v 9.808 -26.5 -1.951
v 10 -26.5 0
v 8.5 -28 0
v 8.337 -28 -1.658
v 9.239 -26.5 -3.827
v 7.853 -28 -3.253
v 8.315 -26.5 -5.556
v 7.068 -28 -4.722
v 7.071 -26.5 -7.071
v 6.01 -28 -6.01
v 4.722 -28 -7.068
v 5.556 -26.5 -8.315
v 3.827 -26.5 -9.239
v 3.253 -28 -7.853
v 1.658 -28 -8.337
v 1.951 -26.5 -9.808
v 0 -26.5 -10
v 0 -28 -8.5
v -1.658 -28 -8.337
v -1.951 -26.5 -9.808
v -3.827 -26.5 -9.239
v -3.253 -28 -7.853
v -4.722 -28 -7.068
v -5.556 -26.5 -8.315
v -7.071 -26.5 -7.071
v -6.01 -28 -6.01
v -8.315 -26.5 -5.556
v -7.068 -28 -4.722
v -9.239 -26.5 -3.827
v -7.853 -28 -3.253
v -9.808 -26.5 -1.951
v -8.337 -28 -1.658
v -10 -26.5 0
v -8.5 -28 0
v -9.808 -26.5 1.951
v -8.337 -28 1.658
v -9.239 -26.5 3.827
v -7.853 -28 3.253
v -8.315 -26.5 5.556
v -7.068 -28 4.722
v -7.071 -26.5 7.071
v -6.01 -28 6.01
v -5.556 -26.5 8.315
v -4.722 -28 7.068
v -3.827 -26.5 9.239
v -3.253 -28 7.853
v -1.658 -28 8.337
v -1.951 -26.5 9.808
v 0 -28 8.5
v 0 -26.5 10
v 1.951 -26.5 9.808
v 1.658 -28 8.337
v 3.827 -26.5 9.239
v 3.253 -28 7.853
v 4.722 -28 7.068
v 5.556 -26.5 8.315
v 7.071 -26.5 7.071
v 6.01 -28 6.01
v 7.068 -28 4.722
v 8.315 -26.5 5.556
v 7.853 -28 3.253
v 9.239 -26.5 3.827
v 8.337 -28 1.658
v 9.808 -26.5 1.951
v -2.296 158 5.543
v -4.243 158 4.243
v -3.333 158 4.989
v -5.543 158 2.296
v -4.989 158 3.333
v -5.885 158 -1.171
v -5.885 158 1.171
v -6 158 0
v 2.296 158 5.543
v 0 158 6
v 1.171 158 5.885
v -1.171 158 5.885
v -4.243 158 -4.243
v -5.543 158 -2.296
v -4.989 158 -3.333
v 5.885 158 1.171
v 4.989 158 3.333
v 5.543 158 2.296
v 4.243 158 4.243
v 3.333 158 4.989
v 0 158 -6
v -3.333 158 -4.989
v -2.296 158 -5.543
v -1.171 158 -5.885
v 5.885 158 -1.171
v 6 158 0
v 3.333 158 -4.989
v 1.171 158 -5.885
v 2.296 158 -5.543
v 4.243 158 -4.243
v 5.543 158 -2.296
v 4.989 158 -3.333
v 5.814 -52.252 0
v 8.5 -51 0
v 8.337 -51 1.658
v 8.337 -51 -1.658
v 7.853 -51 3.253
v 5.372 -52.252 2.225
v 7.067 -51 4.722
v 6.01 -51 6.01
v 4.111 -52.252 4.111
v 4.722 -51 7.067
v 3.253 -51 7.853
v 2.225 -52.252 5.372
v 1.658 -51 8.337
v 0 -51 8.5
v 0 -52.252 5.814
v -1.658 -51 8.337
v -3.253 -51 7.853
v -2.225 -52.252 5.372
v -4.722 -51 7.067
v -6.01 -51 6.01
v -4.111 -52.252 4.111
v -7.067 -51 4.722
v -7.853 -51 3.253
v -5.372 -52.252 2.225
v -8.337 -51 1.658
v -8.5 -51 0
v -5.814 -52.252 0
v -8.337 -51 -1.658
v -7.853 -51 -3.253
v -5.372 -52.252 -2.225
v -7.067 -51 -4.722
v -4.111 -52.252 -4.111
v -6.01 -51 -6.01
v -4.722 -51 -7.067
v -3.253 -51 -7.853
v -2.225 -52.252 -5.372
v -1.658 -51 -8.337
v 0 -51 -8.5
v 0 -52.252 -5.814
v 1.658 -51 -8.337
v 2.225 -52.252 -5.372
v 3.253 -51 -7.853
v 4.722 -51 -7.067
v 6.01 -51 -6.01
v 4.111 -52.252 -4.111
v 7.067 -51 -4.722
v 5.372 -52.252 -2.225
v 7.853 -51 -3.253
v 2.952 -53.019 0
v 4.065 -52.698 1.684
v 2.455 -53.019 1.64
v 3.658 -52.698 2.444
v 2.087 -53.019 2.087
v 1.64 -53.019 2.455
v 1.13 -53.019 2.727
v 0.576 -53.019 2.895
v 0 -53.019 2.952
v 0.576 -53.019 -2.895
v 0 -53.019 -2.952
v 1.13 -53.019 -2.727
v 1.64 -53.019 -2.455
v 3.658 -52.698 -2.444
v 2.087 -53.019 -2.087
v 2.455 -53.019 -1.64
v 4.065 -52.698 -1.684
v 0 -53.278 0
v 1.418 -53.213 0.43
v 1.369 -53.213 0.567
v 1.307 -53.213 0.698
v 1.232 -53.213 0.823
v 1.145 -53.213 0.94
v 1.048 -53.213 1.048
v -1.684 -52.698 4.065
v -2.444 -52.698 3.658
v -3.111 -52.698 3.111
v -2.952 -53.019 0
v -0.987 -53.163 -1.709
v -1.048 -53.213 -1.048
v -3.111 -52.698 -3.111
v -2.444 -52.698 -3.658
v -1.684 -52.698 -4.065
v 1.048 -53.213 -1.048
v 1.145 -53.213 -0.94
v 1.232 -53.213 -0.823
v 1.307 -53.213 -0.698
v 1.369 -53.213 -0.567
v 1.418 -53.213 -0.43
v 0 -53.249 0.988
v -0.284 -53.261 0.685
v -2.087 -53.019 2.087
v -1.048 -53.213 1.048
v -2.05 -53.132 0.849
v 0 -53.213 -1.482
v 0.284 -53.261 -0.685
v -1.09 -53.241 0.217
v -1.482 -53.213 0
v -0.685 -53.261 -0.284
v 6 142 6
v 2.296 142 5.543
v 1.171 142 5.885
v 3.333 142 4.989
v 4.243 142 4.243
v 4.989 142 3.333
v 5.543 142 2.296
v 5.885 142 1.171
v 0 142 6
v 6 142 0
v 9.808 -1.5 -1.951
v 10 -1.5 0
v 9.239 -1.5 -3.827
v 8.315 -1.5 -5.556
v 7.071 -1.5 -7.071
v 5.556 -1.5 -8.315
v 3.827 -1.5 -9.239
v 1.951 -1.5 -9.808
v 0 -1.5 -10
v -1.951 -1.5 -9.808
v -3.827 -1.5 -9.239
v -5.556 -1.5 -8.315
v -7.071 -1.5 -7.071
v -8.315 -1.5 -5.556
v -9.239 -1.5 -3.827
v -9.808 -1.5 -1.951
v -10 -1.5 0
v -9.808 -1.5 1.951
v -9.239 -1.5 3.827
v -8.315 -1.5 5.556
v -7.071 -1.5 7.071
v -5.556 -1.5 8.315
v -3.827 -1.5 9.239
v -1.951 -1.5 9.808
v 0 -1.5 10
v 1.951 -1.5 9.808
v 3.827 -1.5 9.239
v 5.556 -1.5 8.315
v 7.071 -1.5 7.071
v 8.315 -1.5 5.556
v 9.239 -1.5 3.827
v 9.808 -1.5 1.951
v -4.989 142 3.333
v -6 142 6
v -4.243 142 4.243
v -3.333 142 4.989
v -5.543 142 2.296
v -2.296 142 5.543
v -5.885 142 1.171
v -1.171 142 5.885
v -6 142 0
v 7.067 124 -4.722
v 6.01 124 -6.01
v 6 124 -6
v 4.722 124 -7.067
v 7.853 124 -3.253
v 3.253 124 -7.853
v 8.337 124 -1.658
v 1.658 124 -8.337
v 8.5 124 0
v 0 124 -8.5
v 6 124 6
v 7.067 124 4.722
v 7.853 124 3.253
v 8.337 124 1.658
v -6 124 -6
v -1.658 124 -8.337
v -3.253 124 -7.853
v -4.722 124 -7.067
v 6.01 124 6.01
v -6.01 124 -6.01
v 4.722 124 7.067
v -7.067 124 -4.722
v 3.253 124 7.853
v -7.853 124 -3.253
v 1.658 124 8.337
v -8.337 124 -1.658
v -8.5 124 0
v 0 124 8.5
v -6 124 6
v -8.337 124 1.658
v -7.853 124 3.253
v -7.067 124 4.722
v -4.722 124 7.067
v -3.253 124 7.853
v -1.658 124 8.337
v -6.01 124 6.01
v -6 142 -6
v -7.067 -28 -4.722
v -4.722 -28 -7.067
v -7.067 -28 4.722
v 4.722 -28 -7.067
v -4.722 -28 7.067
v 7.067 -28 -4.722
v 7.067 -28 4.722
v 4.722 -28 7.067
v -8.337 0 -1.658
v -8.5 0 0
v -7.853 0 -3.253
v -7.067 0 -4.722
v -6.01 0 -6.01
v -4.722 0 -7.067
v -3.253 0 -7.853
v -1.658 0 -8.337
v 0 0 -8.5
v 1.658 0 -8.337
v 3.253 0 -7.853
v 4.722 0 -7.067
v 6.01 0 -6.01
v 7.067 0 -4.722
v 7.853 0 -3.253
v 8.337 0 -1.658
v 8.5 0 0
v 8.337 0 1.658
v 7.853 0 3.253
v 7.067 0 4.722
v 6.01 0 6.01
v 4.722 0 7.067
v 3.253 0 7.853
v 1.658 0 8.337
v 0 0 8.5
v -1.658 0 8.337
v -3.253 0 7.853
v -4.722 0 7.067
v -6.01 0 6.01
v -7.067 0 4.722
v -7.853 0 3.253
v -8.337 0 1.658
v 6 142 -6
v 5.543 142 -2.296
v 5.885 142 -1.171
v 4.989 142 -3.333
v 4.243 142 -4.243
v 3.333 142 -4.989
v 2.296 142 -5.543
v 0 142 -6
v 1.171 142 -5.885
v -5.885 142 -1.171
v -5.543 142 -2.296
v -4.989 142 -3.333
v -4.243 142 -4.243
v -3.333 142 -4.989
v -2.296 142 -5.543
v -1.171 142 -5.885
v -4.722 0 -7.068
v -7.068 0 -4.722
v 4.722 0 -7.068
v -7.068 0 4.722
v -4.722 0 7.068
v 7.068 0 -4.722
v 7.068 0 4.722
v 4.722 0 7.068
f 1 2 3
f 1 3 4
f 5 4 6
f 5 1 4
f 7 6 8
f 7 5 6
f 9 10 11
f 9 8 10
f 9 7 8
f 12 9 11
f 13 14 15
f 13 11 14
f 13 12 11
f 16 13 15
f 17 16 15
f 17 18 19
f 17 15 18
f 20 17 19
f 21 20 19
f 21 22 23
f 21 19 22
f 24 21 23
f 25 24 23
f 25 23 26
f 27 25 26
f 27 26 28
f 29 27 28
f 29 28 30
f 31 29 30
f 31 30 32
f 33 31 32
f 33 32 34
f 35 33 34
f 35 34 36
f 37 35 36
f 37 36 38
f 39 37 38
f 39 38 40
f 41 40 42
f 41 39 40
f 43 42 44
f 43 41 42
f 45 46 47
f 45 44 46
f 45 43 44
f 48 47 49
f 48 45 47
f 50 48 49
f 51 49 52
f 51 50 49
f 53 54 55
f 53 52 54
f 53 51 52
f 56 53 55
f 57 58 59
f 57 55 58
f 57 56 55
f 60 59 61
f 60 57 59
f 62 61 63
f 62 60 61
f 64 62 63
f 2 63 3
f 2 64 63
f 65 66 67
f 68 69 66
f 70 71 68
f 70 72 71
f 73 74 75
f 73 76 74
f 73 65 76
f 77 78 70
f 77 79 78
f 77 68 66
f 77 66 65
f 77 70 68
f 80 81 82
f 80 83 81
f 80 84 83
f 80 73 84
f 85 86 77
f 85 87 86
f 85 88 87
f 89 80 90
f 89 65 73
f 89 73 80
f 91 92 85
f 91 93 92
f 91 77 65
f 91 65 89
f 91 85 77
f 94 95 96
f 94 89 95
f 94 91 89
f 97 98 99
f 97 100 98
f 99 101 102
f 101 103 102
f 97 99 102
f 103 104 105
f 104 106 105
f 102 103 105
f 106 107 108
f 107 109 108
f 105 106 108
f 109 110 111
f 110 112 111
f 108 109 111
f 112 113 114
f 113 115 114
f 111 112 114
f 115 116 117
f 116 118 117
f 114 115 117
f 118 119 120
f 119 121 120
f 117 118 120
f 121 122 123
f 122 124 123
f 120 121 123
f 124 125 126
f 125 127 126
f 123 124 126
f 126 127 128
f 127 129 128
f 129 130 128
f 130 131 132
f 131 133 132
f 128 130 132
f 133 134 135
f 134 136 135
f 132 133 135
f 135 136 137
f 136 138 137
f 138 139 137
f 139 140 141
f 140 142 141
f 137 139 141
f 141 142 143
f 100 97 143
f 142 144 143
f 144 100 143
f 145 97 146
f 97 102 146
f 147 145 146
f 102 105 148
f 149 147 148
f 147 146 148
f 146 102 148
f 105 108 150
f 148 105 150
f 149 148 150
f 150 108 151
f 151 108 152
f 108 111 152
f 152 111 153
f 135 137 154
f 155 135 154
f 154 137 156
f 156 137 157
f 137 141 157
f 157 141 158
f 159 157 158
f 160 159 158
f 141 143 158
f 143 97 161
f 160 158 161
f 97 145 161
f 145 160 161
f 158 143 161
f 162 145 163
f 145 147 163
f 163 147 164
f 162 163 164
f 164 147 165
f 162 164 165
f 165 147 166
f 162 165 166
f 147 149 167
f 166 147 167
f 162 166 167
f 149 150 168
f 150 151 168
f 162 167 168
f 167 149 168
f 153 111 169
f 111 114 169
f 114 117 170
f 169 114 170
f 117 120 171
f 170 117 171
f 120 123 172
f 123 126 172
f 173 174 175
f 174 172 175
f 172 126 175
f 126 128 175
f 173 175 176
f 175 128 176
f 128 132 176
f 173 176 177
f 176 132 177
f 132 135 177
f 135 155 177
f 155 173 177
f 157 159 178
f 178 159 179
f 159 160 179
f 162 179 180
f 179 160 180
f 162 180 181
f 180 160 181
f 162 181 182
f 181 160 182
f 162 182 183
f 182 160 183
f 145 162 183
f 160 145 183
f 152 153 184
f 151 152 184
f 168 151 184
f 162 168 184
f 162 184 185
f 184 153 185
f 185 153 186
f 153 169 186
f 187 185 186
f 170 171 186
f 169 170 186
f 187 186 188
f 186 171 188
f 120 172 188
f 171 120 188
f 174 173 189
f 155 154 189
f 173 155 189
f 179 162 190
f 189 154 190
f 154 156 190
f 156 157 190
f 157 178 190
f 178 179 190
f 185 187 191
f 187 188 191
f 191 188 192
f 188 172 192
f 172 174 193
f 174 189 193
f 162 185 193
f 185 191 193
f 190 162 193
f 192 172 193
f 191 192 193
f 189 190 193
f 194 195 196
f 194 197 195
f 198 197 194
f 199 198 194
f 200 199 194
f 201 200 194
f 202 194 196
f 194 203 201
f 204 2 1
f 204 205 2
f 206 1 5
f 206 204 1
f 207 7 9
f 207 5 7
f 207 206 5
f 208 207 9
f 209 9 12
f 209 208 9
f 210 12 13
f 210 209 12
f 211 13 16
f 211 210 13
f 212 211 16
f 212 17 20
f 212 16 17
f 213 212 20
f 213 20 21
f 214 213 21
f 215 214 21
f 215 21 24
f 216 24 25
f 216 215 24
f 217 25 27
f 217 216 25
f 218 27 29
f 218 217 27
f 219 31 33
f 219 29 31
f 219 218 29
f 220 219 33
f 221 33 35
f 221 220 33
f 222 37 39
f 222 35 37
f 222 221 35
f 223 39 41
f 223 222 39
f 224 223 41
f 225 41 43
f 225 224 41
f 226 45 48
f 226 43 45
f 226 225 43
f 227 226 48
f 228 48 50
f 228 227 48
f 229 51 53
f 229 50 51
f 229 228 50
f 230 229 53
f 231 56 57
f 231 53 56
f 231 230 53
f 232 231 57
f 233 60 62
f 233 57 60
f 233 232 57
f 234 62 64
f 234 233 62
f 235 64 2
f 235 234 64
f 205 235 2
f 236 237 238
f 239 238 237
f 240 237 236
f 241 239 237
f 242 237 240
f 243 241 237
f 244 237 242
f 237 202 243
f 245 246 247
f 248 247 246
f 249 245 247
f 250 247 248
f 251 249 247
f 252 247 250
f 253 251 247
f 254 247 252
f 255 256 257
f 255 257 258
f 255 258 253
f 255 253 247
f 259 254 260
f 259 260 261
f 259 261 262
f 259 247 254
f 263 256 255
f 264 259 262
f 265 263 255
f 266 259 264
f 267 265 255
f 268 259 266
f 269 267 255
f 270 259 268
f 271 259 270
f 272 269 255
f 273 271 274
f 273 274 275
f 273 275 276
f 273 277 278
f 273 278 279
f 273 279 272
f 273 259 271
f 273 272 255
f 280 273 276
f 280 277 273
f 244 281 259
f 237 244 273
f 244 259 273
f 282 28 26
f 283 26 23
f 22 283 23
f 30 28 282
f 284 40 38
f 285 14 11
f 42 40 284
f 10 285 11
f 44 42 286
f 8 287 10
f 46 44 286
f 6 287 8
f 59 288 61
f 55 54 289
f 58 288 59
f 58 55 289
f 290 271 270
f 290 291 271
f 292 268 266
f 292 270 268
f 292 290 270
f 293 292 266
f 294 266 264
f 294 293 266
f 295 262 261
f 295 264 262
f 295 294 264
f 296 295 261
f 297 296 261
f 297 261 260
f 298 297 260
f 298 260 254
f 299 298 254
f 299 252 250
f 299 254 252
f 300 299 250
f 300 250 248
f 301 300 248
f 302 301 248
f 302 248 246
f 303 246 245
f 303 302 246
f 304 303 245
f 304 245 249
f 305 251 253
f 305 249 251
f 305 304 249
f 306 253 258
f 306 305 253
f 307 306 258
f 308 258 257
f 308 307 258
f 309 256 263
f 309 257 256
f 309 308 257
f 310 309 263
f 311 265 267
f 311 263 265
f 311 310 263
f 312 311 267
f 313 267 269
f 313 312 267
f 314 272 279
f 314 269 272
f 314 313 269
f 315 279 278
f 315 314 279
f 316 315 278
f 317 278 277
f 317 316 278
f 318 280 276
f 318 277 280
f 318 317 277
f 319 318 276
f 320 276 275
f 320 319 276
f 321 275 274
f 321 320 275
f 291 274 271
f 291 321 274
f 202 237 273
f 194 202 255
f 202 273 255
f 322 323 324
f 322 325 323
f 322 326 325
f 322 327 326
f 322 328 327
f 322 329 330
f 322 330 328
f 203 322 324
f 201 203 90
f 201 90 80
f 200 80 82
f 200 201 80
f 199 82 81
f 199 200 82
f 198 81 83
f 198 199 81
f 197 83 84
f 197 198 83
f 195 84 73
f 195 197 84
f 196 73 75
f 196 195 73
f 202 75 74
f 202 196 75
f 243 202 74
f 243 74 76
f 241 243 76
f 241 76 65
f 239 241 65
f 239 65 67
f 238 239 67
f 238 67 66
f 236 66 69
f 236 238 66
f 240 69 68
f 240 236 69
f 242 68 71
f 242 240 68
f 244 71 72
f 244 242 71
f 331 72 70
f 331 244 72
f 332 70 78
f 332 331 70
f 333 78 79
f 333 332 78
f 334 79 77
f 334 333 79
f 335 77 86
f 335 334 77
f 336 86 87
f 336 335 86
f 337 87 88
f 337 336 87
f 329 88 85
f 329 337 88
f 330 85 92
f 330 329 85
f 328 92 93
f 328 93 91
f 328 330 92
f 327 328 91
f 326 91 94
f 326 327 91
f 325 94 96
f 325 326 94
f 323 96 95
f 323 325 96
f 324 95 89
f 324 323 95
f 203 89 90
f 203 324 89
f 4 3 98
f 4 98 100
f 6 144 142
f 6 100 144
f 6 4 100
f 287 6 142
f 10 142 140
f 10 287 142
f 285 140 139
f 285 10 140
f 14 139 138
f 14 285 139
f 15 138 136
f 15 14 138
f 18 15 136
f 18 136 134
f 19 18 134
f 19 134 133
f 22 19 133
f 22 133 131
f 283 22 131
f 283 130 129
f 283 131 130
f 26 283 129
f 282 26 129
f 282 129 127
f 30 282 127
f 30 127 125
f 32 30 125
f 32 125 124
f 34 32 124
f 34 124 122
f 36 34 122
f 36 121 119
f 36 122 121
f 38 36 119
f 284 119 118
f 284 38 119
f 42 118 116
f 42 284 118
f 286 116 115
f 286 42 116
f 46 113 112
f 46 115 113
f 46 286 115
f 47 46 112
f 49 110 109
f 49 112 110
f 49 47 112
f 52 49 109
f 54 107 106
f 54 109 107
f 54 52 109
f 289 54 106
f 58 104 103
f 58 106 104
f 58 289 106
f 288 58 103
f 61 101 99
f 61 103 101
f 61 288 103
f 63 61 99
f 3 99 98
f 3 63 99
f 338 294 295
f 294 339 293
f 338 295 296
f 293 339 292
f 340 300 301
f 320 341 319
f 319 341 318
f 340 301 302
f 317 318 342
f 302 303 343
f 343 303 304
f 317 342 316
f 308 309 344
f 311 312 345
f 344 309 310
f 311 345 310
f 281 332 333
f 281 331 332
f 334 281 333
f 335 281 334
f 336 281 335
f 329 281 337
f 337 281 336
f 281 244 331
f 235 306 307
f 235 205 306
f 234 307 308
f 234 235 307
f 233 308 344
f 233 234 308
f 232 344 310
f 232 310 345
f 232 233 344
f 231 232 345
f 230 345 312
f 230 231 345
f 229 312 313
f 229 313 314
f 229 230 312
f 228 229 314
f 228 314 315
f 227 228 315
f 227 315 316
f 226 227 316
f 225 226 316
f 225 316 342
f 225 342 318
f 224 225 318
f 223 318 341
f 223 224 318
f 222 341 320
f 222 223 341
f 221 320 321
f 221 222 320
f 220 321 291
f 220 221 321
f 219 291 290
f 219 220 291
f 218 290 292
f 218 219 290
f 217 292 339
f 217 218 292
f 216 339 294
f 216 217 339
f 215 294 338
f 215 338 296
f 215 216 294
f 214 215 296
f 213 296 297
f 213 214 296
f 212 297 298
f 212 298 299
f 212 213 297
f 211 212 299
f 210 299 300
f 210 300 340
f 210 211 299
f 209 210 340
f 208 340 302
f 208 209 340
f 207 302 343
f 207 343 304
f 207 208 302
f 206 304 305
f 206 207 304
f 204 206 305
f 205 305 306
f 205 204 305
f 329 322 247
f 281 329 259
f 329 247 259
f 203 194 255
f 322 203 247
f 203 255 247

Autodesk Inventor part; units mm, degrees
ref_plane "YZ Plane" through (0, 0, 0) normal (1, 0, 0) x (0, 1, 0)
ref_plane "XZ Plane" through (0, 0, 0) normal (0, 1, 0) x (-1, 0, 0)
ref_plane "XY Plane" through (0, 0, 0) normal (0, 0, 1) x (1, 0, 0)
sketch "Sketch1" plane through (0, 0, 0) normal (0, 1, 0) x (-1, 0, 0)
  circle A0 centre (0, 0) radius 8.5
  dimension "d0" = 17
extrude "Extrusion1" add sketch "Sketch1" along normal blind 124
sketch "Sketch2" plane through (0, 124, 0) normal (0, 1, 0) x (1, 0, 0)
  line L0 (6, 6) -> (-6, 6)
  line L1 (-6, 6) -> (-6, -6)
  line L2 (-6, -6) -> (6, -6)
  line L3 (6, -6) -> (6, 6)
  line L4 (6, 6) -> (-6, -6) construction
  line L5 (-6, 6) -> (6, -6) construction
  point P0 (0, 0)
  dimension "d3" = 12
  dimension "d4" = 12
extrude "Extrusion2" add sketch "Sketch2" along normal blind 18
sketch "Sketch3" plane through (0, 142, 0) normal (0, 1, 0) x (1, 0, 0)
  circle A0 centre (0, 0) radius 6
  line L0 (-6, 6) -> (-6, -6) projected
  line L1 (6, 6) -> (-6, 6) projected
  line L2 (6, -6) -> (6, 6) projected
  line L3 (-6, -6) -> (6, -6) projected
extrude "Extrusion3" add sketch "Sketch3" along normal blind 16 contours A0
sketch "Sketch4" plane through (0, 0, 0) normal (0, -1, 0) x (1, 0, 0)
  circle A0 centre (0, 0) radius 8.5 projected
  circle A1 centre (0, 0) radius 10
  dimension "d9" = 20
extrude "Extrusion4" add sketch "Sketch4" along normal blind 28 contours A0 | A1
sketch "Sketch5" plane through (0, -28, 0) normal (0, -1, 0) x (1, 0, 0)
  circle A0 centre (0, 0) radius 8.5
  dimension "d12" = 17
extrude "Extrusion5" add sketch "Sketch5" along normal blind 23
chamfer "Chamfer1" distance 1.5 angle 45 2 edges at (-10, -28, 0) (-10, 0, 0)
sketch "Sketch6" plane through (0, 0, 0) normal (0, 0, 1) x (1, 0, 0)
  line L0 (-8.5, -51) -> (8.5, -51) projected
  arc A0 (0, -53.2776) -> (8.5, -51) centre (0, -36.2776) ccw
  line L1 (0, -51) -> (0, -53.2776)
  point P0 (0, 0)
revolve "Revolution1" add sketch "Sketch6" angle 360 about axis through (0, -51, 0) along (0, -1, 0)
thread "Thread1" size "M12x1" class "6g" standard "ANSI Metric M Profile" full length
thread "Thread2" size "M20x2.5" class "6g" standard "ANSI Metric M Profile" full length
properties part number "00.32.010 \"Spindle\"" material "Steel"
